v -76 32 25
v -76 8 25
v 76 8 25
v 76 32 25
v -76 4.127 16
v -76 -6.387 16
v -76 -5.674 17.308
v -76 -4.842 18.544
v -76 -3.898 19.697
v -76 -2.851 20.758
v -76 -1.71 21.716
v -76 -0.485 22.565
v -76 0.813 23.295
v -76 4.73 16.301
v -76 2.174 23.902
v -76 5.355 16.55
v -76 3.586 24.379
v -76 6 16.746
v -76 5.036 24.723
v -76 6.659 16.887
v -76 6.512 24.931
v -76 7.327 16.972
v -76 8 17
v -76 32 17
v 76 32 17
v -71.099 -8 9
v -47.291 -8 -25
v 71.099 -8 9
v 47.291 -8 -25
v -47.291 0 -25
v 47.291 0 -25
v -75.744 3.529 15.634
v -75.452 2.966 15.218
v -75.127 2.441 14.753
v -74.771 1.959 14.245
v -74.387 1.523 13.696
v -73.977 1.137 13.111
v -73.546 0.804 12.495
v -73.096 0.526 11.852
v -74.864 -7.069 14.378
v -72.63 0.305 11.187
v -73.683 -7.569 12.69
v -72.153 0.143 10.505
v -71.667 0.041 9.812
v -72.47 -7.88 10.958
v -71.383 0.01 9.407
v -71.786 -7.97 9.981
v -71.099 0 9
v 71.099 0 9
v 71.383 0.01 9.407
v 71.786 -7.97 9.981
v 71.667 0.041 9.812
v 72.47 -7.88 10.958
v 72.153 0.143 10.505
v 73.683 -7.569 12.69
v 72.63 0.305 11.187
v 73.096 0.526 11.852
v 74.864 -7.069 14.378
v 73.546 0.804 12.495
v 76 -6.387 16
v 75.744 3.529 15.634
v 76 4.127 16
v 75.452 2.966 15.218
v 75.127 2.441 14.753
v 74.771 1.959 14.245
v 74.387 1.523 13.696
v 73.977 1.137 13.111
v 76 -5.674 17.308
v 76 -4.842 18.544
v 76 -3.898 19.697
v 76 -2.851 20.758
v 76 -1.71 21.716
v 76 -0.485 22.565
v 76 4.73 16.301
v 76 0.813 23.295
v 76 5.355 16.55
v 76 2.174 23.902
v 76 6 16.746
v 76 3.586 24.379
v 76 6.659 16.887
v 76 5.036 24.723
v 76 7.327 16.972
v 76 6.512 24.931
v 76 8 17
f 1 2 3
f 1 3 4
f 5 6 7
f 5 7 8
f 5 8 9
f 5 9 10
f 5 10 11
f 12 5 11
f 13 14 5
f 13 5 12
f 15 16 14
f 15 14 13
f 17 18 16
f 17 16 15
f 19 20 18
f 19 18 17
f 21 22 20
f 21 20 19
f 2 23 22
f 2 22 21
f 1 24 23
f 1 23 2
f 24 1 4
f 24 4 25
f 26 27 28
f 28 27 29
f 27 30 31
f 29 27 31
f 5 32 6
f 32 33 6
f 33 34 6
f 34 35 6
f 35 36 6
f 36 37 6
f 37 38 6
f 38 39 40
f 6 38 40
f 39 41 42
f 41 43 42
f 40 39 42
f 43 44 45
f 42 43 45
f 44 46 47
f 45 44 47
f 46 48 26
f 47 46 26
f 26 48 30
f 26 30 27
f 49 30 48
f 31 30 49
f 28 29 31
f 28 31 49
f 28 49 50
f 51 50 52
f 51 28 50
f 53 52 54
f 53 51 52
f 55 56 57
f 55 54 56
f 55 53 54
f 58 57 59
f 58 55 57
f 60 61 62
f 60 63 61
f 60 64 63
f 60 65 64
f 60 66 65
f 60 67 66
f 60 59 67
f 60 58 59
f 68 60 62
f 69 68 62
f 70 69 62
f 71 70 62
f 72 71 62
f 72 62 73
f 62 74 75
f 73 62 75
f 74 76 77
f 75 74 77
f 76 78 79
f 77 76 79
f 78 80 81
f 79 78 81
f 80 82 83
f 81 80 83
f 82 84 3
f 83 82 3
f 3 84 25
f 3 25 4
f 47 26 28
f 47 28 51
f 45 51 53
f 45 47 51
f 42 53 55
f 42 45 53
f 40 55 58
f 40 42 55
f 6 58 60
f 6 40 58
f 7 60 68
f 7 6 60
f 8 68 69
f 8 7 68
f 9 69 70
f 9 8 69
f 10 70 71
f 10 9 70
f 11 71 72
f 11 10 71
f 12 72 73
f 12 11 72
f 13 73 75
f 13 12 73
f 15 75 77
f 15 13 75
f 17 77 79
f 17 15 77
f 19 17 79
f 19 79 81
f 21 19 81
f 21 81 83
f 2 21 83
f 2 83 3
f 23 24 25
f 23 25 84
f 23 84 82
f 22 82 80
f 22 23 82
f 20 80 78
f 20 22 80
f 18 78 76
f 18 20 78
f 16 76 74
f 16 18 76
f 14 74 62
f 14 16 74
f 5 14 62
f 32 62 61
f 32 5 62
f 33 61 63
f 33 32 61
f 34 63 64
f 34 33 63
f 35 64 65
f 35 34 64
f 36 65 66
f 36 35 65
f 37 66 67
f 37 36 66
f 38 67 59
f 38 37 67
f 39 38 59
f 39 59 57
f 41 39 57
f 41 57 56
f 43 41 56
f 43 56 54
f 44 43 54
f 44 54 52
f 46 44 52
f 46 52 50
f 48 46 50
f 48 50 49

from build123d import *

# Parameters (mm, degrees)
SKETCH1_W                    = 152
SKETCH1_H                    = 50
BASE_FLANGE1_DEPTH           = 8
EDGE_FLANGE1_STRIP_W         = 48
EDGE_FLANGE1_STRIP_H         = 8
EDGE_FLANGE1_STRIP_CUT_DEPTH = 152
EDGE_FLANGE1_DEPTH           = 152
CHAMFER1_SIZE                = 41
CHAMFER1_SIZE2               = 28.708509067
MIRROR3_START                = 53.078332384
MIRROR3_OUTLINE_W            = 53
MIRROR3_OUTLINE_H            = 14
MIRROR3_DEPTH                = 23.516633891


# Read off the part's stored shape, not the designer's step: Mirror3
# Sheet-metal steps are written as plain solids
with BuildPart() as part:
    # Sketch1 → Base-Flange1 (new body)
    with BuildSketch(Plane(origin=(0, 0, 0), x_dir=(1, 0, 0), z_dir=(0, 1, 0))):
        Rectangle(SKETCH1_W, SKETCH1_H)
    extrude(amount=-BASE_FLANGE1_DEPTH)

    # Edge-Flange1 strip (across the edge) → Edge-Flange1 strip cut (cut)
    with BuildSketch(Plane(origin=(-76, 0, 25), x_dir=(0, 0, -1), z_dir=(1, 0, 0))):
        with Locations((-8, -4)):
            Rectangle(EDGE_FLANGE1_STRIP_W, EDGE_FLANGE1_STRIP_H)
    extrude(amount=EDGE_FLANGE1_STRIP_CUT_DEPTH, mode=Mode.SUBTRACT)

    # Edge-Flange1 section (across the edge) → Edge-Flange1 (add)
    with BuildSketch(Plane(origin=(-76, 0, 25), x_dir=(0, 0, -1), z_dir=(1, 0, 0))):
        with BuildLine():
            Line((0, 8), (0, 32))
            Line((0, 32), (8, 32))
            Line((8, 32), (8, 8))
            ThreePointArc((8, 8), (10.343145751, 2.343145751), (16, 0))
            Line((16, 0), (16, -8))
            ThreePointArc((16, -8), (4.686291501, -3.313708499), (0, 8))
        make_face()
    extrude(amount=EDGE_FLANGE1_DEPTH)

    # Chamfer1
    chamfer1_edges = [part.edges().sort_by_distance(p)[0] for p in [
        (-76, -4, -25),
    ]]
    chamfer1_side = [part.faces().sort_by_distance(p)[0] for p in [
        (-76, -0.640312424, -8),
    ]]
    chamfer(chamfer1_edges, length=CHAMFER1_SIZE, length2=CHAMFER1_SIZE2, reference=chamfer1_side[0])

    # Mirror3 outline → Mirror3 (cut)
    with BuildSketch(Plane(origin=(0, 0, 0), x_dir=(0.5735764363510512, 0, 0.8191520442889882), z_dir=(0.8191520442889882, 0, -0.5735764363510512)).offset(MIRROR3_START)):
        with Locations((31.5, 1)):
            Rectangle(MIRROR3_OUTLINE_W, MIRROR3_OUTLINE_H)
    extrude(amount=MIRROR3_DEPTH, mode=Mode.SUBTRACT)


solid = part.part
